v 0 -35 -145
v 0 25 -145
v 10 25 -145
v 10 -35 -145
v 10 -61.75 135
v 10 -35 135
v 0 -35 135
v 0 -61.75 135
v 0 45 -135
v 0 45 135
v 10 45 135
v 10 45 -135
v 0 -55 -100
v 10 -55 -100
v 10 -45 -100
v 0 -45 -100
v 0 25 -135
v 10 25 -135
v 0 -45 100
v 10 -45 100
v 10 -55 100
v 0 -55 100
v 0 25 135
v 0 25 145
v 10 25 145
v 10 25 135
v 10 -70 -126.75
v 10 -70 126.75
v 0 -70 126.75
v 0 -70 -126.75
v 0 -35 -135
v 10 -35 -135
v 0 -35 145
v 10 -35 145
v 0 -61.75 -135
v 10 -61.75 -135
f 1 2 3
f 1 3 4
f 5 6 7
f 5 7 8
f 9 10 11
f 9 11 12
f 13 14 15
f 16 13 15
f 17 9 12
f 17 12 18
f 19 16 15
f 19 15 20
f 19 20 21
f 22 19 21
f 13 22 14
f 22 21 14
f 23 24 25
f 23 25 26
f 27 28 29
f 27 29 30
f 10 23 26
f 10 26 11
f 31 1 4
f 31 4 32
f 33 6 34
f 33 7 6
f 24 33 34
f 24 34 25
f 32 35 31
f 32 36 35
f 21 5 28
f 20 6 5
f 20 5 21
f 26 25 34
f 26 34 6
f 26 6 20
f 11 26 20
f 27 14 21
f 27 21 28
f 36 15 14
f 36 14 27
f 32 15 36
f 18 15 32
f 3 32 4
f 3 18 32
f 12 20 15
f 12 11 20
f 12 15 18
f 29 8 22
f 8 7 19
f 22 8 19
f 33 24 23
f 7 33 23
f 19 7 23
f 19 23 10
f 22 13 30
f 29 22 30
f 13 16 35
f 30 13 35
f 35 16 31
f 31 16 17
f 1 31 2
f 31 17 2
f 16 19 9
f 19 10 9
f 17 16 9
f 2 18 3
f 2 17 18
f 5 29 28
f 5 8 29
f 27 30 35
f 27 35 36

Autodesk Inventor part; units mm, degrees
ref_plane "YZ Plane" through (0, 0, 0) normal (1, 0, 0) x (0, 1, 0)
ref_plane "XZ Plane" through (0, 0, 0) normal (0, 1, 0) x (-1, 0, 0)
ref_plane "XY Plane" through (0, 0, 0) normal (0, 0, 1) x (1, 0, 0)
sketch "Sketch1" plane through (0, 0, 0) normal (1, 0, 0) x (0, 1, 0)
  line L0 (-45, 135) -> (45, 135)
  line L1 (45, 135) -> (45, -135)
  line L2 (45, -135) -> (-45, -135)
  line L3 (-45, -135) -> (-45, 135)
  line L4 (-45, 135) -> (45, -135) construction
  line L5 (45, 135) -> (-45, -135) construction
  point P0 (0, 0)
  dimension "d0" = 90
  dimension "d1" = 270
extrude "Extrusion1" add sketch "Sketch1" along normal blind 10
sketch "Sketch2" plane through (0, 0, 0) normal (-1, 0, 0) x (0, 0, 1)
  line L0 (-135, -45) -> (-135, 45) projected
  line L1 (135, -45) -> (-135, -45) projected
  line L2 (135, 45) -> (135, -45) projected
  line L3 (-135, 45) -> (135, 45) projected
  line L4 (0, 45) -> (0, -5)
  line L5 (145, 25) -> (-145, 25)
  line L6 (-145, 25) -> (-145, -35)
  line L7 (-145, -35) -> (145, -35)
  line L8 (145, -35) -> (145, 25)
  line L9 (145, 25) -> (-145, -35) construction
  line L10 (-145, 25) -> (145, -35) construction
  point P0 (-135, -35)
  point P1 (-135, 25)
  point P2 (135, 25)
  point P3 (135, -35)
  dimension "d8" = 90
  dimension "d9" = 50
  dimension "d10" = 60
  dimension "d11" = 290
  dimension "d12" = 270
extrude "Extrusion2" add sketch "Sketch2" against normal blind 10 contours L7 L6 L5 L0 | L2 L5 L8 L7
sketch "Sketch3" plane through (10, 0, 0) normal (1, 0, 0) x (0, 0, -1)
  line L0 (135, -45) -> (135, -35) projected
  line L1 (135, -35) -> (145, -35) projected
  line L2 (145, -35) -> (145, 25) projected
  line L3 (145, 25) -> (135, 25) projected
  line L4 (135, 25) -> (135, 45) projected
  line L5 (135, 45) -> (-135, 45) projected
  line L6 (-135, 45) -> (-135, 25) projected
  line L7 (-135, 25) -> (-145, 25) projected
  line L8 (-145, 25) -> (-145, -35) projected
  line L9 (-145, -35) -> (-135, -35) projected
  line L10 (-135, -35) -> (-135, -45) projected
  line L11 (-135, -45) -> (135, -45) projected
  line L12 (135, -20) -> (-135, -20)
  line L13 (-135, -20) -> (-135, -70)
  line L14 (-135, -70) -> (135, -70)
  line L15 (135, -70) -> (135, -20)
  line L16 (135, -20) -> (-135, -70) construction
  line L17 (-135, -20) -> (135, -70) construction
  line L18 (100, -35) -> (-100, -35)
  line L19 (-100, -35) -> (-100, -55)
  line L20 (-100, -55) -> (100, -55)
  line L21 (100, -55) -> (100, -35)
  line L22 (100, -35) -> (-100, -55) construction
  line L23 (-100, -35) -> (100, -55) construction
  point P0 (0, 0)
  point P1 (0, -45)
  point P2 (100, -45)
  point P3 (-100, -45)
  dimension "d13" = 25
  dimension "d14" = 200
  dimension "d15" = 10
extrude "Extrusion3" add sketch "Sketch3" against normal blind 10 contours L15 L14 L13 L11 L19 L20 L21
chamfer "Chamfer1" distance 8.25 angle 45 2 edges at (5, -70, 135) (5, -70, -135)
properties part number "03_Tam_mat_truoc" material "Stainless Steel, Austenitic"
